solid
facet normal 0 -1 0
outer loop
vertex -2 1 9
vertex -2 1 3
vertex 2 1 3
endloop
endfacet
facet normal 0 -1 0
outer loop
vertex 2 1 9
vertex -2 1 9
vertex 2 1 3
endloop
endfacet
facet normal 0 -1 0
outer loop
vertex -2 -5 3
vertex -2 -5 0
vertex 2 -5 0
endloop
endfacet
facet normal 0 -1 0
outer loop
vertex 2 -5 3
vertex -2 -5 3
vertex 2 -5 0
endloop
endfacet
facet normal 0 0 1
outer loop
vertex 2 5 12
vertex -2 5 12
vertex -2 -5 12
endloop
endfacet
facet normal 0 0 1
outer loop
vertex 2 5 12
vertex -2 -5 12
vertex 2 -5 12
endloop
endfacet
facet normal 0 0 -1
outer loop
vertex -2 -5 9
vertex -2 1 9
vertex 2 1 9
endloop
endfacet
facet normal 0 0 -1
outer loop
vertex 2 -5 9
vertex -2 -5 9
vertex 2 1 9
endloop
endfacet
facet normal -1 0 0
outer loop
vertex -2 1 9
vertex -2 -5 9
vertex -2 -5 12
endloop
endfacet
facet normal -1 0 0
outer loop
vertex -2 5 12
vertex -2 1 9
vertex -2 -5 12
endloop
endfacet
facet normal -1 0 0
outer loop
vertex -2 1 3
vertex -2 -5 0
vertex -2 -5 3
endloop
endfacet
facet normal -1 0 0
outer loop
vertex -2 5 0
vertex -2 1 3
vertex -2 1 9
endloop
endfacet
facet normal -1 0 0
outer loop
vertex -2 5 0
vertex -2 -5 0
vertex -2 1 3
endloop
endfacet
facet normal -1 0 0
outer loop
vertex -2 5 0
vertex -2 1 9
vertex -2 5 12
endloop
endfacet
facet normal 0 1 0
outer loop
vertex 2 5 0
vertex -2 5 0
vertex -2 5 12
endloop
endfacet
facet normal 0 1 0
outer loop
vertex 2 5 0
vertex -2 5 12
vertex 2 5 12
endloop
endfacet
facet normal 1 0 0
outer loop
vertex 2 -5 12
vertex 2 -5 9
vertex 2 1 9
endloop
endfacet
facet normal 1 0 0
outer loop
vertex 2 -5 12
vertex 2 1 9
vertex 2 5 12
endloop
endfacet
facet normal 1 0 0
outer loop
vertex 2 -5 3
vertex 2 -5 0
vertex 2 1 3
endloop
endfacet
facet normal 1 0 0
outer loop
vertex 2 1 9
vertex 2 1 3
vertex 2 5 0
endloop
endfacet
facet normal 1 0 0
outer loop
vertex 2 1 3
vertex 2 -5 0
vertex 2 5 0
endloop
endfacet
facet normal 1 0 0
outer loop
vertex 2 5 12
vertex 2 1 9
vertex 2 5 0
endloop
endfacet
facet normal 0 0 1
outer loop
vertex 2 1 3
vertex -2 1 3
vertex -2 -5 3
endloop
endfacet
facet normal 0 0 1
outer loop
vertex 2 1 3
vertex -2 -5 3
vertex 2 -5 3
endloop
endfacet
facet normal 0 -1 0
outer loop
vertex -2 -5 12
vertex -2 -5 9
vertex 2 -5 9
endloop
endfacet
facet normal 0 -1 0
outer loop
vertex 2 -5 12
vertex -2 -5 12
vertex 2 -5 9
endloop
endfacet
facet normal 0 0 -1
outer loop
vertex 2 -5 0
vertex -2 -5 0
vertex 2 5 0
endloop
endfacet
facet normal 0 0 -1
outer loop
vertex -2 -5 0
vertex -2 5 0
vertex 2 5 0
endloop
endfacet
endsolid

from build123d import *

# Parameters (mm, degrees)
F0_W     = 4
F0_H     = 4
F0_H_2   = 6
F1_DEPTH = 12
F2_DEPTH = 9
F3_DEPTH = 3


with BuildPart() as f1:
    # F0 (on Top) → F1 (new body)
    with BuildSketch(Plane.XY):
        with Locations((0, 3)):
            Rectangle(F0_W, F0_H)
        with Locations((0, -2)):
            Rectangle(F0_W, F0_H_2)
    extrude(amount=F1_DEPTH)

    # F0 (on Top) → F2 (cut)
    with BuildSketch(Plane.XY):
        with Locations((0, -2)):
            Rectangle(F0_W, F0_H_2)
    extrude(amount=F2_DEPTH, mode=Mode.SUBTRACT)

    # F0 (on Top) → F3 (join)
    with BuildSketch(Plane.XY):
        with Locations((0, -2)):
            Rectangle(F0_W, F0_H_2)
    extrude(amount=F3_DEPTH)


solid = f1.part
